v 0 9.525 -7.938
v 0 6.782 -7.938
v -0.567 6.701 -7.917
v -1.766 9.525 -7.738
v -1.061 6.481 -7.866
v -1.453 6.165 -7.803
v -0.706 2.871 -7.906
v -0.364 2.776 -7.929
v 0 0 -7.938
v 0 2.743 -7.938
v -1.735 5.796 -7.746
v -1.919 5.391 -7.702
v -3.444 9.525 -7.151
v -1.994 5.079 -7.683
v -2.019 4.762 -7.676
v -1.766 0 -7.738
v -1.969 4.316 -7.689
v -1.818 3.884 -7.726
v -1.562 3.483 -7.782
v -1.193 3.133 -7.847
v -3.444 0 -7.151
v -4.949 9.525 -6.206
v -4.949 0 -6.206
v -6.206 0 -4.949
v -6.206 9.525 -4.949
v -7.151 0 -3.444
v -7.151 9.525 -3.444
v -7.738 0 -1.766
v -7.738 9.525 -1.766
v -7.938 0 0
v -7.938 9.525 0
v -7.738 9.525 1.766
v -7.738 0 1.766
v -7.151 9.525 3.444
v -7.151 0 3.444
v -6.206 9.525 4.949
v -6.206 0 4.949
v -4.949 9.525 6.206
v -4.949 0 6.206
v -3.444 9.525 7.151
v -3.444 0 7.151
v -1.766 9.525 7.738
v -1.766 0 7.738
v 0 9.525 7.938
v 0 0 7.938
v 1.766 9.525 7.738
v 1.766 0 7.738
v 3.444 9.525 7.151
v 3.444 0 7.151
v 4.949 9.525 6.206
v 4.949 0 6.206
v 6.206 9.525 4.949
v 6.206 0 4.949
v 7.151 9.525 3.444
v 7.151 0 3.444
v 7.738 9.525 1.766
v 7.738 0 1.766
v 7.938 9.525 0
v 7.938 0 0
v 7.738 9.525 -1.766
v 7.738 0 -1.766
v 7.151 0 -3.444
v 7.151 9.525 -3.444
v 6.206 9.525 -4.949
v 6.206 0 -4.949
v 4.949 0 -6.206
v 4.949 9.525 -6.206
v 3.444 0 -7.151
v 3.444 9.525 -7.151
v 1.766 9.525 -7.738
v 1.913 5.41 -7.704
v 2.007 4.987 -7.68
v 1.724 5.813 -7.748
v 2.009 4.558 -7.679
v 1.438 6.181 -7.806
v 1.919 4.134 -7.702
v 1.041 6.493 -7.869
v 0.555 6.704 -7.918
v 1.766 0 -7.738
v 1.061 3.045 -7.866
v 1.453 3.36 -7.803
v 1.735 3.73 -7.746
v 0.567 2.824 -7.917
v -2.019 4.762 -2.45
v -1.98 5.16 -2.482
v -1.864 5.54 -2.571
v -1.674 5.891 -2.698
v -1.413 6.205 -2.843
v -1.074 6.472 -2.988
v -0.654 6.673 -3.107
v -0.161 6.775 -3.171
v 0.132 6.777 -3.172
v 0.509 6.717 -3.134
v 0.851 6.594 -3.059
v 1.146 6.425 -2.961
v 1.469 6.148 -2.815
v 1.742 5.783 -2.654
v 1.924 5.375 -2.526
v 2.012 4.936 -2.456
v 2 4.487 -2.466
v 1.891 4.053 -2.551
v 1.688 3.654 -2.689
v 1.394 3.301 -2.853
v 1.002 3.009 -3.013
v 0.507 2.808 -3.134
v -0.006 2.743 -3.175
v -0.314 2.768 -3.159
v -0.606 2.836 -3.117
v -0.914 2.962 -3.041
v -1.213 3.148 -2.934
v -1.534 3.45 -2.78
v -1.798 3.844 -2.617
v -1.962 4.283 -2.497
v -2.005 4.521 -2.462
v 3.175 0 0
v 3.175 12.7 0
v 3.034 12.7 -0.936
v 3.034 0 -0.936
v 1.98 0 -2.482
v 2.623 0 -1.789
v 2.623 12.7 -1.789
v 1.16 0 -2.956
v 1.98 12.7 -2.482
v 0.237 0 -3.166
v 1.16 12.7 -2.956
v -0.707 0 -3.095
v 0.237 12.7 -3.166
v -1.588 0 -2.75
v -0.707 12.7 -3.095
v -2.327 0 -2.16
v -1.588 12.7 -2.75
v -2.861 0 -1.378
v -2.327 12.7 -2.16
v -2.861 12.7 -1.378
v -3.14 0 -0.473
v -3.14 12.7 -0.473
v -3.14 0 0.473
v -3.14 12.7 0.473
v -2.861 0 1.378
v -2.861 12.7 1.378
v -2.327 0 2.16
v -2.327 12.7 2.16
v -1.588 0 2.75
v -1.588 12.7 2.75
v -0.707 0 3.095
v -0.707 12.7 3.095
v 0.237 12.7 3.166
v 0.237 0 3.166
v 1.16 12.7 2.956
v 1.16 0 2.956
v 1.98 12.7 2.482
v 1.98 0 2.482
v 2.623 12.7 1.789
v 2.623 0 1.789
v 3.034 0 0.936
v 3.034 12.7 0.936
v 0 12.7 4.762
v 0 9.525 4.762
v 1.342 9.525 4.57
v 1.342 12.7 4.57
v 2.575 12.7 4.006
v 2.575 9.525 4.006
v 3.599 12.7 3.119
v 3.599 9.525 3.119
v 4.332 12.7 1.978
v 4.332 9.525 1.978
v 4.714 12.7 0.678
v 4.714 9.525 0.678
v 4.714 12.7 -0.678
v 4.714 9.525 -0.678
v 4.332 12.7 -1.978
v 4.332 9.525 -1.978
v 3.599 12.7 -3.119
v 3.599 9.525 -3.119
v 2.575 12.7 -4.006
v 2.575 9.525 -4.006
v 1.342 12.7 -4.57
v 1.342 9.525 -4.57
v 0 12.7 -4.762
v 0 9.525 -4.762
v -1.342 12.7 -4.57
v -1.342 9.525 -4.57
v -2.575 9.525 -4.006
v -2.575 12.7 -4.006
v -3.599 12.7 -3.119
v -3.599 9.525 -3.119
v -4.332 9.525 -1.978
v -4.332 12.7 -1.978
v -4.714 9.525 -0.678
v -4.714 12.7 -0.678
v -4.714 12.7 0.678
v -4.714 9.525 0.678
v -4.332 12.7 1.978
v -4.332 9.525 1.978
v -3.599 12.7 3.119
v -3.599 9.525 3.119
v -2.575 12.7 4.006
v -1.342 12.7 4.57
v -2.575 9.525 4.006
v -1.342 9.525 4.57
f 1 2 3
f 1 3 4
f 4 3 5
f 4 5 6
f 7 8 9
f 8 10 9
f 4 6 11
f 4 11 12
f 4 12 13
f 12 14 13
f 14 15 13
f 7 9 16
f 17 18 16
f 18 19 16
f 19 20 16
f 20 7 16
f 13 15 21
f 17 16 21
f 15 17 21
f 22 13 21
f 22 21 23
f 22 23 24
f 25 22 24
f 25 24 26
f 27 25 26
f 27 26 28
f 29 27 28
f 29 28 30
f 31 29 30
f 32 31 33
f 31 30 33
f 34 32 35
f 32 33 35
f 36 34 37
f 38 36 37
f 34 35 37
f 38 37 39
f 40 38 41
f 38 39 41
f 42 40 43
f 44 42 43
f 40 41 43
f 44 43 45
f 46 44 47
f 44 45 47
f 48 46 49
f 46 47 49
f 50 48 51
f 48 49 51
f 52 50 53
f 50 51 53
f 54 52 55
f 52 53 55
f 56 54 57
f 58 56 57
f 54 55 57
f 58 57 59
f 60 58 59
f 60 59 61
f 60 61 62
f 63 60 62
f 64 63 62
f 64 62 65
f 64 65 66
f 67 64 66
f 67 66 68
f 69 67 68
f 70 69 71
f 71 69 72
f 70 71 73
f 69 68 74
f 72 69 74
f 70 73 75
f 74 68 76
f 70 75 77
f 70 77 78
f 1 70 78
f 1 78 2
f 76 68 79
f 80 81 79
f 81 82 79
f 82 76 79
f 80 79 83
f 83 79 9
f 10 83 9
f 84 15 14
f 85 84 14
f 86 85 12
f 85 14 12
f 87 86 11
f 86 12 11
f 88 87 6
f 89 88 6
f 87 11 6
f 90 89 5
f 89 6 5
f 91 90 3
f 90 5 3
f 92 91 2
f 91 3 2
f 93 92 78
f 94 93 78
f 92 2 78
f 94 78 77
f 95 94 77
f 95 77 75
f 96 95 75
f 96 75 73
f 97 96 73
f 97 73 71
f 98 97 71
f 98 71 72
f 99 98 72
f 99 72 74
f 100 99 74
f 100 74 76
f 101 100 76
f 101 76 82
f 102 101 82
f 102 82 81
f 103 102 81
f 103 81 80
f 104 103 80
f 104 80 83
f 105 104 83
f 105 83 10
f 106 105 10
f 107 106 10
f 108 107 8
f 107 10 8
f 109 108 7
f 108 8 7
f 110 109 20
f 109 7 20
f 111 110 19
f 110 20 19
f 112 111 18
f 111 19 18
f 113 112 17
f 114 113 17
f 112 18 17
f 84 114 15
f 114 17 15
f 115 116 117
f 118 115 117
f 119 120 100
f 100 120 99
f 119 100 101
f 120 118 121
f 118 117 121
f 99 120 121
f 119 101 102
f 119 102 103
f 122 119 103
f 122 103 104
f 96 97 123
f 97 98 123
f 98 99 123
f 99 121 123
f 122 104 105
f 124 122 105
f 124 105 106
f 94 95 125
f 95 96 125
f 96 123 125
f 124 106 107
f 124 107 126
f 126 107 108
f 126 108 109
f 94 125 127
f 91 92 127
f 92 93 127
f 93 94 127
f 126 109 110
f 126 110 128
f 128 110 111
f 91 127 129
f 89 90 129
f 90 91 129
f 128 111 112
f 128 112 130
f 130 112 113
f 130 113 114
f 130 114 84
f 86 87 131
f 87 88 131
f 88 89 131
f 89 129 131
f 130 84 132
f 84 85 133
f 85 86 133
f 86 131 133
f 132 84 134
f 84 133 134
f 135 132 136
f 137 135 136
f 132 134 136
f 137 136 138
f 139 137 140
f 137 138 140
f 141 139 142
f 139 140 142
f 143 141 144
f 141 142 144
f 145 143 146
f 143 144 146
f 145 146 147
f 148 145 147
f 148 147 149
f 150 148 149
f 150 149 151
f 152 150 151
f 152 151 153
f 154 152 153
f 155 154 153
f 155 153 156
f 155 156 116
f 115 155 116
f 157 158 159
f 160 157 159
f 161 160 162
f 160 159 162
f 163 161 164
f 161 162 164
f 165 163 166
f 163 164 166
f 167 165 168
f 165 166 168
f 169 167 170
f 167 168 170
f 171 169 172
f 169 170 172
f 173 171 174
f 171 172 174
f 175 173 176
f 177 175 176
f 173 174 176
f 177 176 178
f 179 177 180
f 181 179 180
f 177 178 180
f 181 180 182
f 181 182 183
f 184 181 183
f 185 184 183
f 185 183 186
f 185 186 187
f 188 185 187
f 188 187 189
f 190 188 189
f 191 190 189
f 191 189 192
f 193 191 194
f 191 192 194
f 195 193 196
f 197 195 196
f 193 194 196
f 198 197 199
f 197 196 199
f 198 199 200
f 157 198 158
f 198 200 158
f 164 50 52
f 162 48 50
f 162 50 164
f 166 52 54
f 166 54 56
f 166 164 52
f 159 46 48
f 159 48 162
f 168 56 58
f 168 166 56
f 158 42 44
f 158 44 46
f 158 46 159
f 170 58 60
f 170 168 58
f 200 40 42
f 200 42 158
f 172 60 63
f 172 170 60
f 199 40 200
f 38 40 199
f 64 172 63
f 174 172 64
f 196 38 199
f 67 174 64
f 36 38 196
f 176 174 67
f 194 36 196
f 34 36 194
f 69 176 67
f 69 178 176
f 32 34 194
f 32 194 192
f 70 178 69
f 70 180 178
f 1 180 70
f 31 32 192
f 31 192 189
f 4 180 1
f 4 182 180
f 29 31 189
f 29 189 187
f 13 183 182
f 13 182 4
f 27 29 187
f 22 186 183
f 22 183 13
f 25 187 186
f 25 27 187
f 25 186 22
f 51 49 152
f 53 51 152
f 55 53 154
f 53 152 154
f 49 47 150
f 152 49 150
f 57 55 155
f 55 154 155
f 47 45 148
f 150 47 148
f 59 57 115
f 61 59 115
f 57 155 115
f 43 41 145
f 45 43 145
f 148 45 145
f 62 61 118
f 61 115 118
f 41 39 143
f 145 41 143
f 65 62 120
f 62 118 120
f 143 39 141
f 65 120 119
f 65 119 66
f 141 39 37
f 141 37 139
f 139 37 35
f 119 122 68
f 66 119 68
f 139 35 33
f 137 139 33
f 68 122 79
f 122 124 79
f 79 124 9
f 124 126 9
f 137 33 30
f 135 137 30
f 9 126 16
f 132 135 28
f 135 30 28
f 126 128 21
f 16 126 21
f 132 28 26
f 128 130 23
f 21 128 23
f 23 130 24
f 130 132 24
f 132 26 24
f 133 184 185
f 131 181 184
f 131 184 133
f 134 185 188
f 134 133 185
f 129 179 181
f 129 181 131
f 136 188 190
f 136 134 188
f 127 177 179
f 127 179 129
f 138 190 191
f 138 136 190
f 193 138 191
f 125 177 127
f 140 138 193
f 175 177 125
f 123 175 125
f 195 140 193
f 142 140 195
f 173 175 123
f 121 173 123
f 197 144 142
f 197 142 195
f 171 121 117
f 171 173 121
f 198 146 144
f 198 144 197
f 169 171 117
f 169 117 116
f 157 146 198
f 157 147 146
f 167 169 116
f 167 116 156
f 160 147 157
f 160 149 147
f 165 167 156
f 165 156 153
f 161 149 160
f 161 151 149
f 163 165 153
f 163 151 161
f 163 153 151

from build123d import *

# Parameters (mm, degrees)
SKETCH1_R                   = 7.9375
BOSS_EXTRUDE1_DEPTH         = 9.525
SKETCH2_R                   = 4.7625
BOSS_EXTRUDE2_DEPTH         = 3.175
F_1_4_0_25_DIAMETER_HOLE1_D = 6.35
F_10_32_TAPPED_HOLE1_REACH  = 23.825
F_10_32_TAPPED_HOLE1_BORE_R = 2.0193


with BuildPart() as part:
    # Sketch1 → Boss-Extrude1 (new body)
    with BuildSketch(Plane(origin=(0, 0, 0), x_dir=(1, 0, 0), z_dir=(0, 1, 0))):
        with Locations(Location((0, 0, 0), (0, 0, 90))):
            Circle(SKETCH1_R)
    extrude(amount=BOSS_EXTRUDE1_DEPTH)

    # Sketch2 → Boss-Extrude2 (add)
    with BuildSketch(Plane(origin=(0, 9.525, 0), x_dir=(1, 0, 0), z_dir=(0, 1, 0))):
        with Locations(Location((0, 0, 0), (0, 0, 270))):
            Circle(SKETCH2_R)
    extrude(amount=BOSS_EXTRUDE2_DEPTH)

    # 1/4 (0.25) Diameter Hole1 (through all)
    with Locations(Plane(origin=(0, 0, 0), x_dir=(-1, 0, 0), z_dir=(0, -1, 0))):
        with Locations((0, 0)):
            Hole(F_1_4_0_25_DIAMETER_HOLE1_D / 2)

    # #10-32 Tapped Hole1 bore → #10-32 Tapped Hole1 (cut, up to next)
    with BuildSketch(Plane(origin=(0, 0, -7.9375), x_dir=(-1, 0, 0), z_dir=(0, 0, -1)), mode=Mode.PRIVATE) as f_10_32_tapped_hole1_sk1:
        with Locations((0, 4.7625)):
            Circle(F_10_32_TAPPED_HOLE1_BORE_R)
    f_10_32_tapped_hole1_tool1 = extrude(f_10_32_tapped_hole1_sk1.sketch, amount=-F_10_32_TAPPED_HOLE1_REACH, mode=Mode.PRIVATE) & part.part
    add(f_10_32_tapped_hole1_tool1.solids().sort_by_distance((0, 4.7625, -7.9375))[0], mode=Mode.SUBTRACT)


solid = part.part
